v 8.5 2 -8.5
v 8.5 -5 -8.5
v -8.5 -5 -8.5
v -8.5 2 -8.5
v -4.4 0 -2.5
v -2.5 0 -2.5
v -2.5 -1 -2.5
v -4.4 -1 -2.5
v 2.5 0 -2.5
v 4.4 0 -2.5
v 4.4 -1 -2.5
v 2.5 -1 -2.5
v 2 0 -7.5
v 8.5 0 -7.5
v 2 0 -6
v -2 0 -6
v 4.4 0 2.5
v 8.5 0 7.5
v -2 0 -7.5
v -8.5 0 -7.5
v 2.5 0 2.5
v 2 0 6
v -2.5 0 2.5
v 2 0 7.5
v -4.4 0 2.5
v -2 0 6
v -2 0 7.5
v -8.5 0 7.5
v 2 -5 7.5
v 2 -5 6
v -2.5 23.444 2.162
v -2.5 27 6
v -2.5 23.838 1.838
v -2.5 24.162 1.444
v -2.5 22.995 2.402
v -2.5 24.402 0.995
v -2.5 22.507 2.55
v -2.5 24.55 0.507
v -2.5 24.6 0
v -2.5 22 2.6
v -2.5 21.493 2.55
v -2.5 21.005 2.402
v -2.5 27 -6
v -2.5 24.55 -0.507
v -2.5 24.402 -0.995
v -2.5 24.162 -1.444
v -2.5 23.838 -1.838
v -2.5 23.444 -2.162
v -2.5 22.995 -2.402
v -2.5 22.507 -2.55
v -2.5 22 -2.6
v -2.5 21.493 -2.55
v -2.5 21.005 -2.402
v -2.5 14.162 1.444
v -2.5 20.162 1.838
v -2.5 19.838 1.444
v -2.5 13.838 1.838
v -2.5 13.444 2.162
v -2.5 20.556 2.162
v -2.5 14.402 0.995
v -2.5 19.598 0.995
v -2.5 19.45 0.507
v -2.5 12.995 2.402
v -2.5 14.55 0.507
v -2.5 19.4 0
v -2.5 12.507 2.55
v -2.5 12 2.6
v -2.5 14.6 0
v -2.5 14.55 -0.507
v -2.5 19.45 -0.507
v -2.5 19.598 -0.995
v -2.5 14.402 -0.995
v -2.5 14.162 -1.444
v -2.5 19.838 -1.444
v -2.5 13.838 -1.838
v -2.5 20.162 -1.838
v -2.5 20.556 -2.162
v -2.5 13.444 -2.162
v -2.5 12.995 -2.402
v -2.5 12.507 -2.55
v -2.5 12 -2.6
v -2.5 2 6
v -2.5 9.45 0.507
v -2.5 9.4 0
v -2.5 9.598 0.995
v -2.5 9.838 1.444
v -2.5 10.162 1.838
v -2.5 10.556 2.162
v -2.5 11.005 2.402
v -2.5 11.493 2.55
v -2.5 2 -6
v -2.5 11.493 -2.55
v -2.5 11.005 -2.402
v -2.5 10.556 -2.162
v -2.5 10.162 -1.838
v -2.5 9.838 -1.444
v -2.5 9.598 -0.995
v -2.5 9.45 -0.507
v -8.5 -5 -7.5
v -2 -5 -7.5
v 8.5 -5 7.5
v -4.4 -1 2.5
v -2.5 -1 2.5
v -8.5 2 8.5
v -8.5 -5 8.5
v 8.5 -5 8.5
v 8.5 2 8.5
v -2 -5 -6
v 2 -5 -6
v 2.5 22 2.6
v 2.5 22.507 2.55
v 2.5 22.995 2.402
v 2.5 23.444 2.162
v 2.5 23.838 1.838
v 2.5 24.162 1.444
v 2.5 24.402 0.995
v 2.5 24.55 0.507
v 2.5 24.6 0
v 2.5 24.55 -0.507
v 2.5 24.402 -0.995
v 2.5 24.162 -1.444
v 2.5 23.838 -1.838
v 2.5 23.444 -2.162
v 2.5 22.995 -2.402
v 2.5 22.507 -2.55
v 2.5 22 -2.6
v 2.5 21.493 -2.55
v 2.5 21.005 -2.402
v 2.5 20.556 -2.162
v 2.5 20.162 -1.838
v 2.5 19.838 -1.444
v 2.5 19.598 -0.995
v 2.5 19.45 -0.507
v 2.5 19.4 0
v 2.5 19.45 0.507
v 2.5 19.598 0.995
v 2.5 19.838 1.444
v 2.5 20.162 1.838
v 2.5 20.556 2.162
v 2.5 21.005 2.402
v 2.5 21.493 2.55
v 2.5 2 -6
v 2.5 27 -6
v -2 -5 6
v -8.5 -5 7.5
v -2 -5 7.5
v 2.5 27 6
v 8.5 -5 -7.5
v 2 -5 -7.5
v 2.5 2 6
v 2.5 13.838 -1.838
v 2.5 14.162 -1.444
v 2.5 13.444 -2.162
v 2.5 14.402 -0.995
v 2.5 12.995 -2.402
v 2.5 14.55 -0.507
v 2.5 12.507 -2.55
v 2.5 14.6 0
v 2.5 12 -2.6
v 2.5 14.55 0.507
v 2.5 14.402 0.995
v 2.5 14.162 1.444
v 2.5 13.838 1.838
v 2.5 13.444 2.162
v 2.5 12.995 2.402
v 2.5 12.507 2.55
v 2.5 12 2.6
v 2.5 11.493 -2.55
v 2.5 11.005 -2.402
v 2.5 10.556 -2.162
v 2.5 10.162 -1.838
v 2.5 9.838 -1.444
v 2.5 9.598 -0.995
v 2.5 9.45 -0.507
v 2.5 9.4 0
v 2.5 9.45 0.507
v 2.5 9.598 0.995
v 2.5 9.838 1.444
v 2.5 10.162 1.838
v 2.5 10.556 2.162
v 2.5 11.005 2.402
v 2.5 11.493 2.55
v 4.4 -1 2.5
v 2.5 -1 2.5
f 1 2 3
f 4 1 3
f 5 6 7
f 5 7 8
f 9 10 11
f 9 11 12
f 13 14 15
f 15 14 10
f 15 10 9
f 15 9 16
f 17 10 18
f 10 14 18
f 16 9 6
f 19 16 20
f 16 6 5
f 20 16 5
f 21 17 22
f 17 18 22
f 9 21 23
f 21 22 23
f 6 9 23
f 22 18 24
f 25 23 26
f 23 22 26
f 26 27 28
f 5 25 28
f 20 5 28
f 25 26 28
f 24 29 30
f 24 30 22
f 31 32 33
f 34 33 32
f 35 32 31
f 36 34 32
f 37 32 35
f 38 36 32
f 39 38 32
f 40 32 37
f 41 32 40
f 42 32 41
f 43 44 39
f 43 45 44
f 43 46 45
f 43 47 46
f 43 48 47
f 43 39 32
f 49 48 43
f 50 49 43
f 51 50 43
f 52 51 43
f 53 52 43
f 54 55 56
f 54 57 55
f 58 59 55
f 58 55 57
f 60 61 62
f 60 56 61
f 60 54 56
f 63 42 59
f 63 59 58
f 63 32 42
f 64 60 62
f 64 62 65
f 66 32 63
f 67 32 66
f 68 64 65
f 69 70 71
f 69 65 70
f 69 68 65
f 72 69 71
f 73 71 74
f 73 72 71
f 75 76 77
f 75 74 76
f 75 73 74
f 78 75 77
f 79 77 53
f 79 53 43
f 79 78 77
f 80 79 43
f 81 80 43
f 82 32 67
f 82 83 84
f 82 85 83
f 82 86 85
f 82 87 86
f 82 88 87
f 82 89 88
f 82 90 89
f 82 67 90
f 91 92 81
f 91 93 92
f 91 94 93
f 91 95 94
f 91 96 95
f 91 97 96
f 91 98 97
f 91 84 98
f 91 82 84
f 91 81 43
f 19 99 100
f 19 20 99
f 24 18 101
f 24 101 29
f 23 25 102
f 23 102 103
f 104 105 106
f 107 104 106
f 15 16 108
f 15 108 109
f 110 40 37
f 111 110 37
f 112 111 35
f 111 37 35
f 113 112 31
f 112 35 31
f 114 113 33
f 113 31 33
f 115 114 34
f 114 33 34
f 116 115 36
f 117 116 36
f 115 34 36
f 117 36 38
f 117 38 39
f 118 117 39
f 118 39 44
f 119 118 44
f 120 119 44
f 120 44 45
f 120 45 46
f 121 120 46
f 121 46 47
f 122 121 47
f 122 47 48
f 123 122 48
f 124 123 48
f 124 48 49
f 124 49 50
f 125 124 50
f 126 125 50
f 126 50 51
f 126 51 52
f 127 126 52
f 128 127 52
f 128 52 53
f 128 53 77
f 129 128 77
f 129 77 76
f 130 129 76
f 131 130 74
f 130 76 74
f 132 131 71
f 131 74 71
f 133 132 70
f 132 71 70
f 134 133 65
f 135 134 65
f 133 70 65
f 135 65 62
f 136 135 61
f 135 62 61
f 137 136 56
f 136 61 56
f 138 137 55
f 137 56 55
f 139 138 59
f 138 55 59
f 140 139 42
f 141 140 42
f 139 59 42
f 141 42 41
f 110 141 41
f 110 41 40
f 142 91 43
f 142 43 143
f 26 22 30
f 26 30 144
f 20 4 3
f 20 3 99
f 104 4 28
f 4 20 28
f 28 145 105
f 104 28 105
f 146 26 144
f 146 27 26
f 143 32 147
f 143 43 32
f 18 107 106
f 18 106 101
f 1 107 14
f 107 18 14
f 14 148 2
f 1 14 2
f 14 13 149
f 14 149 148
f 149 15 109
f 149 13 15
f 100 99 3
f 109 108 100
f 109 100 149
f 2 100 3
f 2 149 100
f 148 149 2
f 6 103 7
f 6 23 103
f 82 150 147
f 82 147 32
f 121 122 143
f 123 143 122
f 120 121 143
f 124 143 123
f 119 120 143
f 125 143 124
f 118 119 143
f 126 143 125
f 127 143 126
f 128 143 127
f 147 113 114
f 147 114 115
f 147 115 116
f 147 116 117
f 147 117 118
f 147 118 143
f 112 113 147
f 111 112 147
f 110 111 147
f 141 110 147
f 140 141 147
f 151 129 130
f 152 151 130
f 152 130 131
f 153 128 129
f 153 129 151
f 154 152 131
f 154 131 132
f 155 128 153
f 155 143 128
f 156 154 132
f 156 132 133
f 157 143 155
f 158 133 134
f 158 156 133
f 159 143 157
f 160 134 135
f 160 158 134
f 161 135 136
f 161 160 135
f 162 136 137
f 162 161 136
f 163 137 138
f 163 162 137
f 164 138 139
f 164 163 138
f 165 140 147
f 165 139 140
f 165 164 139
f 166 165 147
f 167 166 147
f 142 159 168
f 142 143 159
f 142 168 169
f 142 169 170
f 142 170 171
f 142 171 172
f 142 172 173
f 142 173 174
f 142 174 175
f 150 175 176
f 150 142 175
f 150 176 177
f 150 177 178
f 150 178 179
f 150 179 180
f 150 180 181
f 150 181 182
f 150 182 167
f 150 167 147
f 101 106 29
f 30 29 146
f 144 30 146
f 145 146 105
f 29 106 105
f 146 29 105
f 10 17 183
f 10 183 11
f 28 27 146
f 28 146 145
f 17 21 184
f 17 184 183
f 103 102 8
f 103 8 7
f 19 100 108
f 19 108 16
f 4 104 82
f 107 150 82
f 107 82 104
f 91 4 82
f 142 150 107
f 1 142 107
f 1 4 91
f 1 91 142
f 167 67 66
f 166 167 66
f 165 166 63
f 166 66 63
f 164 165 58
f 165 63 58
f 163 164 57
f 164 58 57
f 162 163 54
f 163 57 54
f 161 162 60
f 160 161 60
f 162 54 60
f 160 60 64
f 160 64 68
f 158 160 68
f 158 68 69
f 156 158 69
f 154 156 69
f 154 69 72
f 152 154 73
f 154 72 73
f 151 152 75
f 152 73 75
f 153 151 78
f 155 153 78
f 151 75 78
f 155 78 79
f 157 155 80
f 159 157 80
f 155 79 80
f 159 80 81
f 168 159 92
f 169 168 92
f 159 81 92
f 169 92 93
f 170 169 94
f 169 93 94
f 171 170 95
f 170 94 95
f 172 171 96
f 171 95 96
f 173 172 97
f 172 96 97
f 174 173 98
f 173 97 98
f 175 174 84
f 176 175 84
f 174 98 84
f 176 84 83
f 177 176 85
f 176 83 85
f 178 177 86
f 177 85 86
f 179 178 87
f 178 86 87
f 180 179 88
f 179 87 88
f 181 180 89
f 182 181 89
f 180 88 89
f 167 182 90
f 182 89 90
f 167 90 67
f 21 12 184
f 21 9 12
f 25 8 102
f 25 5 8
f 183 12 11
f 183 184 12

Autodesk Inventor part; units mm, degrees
ref_plane "YZ Plane" through (0, 0, 0) normal (1, 0, 0) x (0, 1, 0)
ref_plane "XZ Plane" through (0, 0, 0) normal (0, 1, 0) x (-1, 0, 0)
ref_plane "XY Plane" through (0, 0, 0) normal (0, 0, 1) x (1, 0, 0)
sketch "草圖1" plane through (0, 0, 0) normal (0, 1, 0) x (-1, 0, 0)
  line L0 (8.5, 8.5) -> (-8.5, 8.5)
  line L1 (-8.5, 8.5) -> (-8.5, -8.5)
  line L2 (-8.5, -8.5) -> (8.5, -8.5)
  line L3 (8.5, -8.5) -> (8.5, 8.5)
  line L4 (8.5, 8.5) -> (-8.5, -8.5) construction
  line L5 (-8.5, 8.5) -> (8.5, -8.5) construction
  point P0 (0, 0)
  dimension "d0" = 17
  dimension "d1" = 17
extrude "擠出1" add sketch "草圖1" along normal blind 2
sketch "草圖3" plane through (0, 0, 0) normal (0, -1, 0) x (1, 0, 0)
  line L0 (-4.4, 2.5) -> (-2.5, 2.5)
  line L1 (-2.5, 2.5) -> (-2.5, -2.5)
  line L2 (-2.5, -2.5) -> (-4.4, -2.5)
  line L3 (-4.4, -2.5) -> (-4.4, 2.5)
  line L4 (-4.4, 2.5) -> (-2.5, -2.5) construction
  line L5 (-2.5, 2.5) -> (-4.4, -2.5) construction
  line L6 (2.5, 2.5) -> (4.4, 2.5)
  line L7 (4.4, 2.5) -> (4.4, -2.5)
  line L8 (4.4, -2.5) -> (2.5, -2.5)
  line L9 (2.5, -2.5) -> (2.5, 2.5)
  line L10 (2.5, 2.5) -> (4.4, -2.5) construction
  line L11 (4.4, 2.5) -> (2.5, -2.5) construction
  point P0 (0, 0)
  point P1 (-3.45, 0)
  point P2 (3.45, 0)
  dimension "d4" = 1.9
  dimension "d5" = 1.9
  dimension "d6" = 5
  dimension "d7" = 5
  dimension "d8" = 0
  dimension "d9" = 5
  dimension "d10" = 2.5
extrude "擠出2" add sketch "草圖3" along normal blind 1
sketch "草圖4" plane through (0, 0, 0) normal (0, -1, 0) x (1, 0, 0)
  line L0 (-8.5, -8.5) -> (-8.5, 8.5) projected
  line L1 (8.5, 8.5) -> (8.5, -8.5) projected
  line L2 (-8.5, 8.5) -> (8.5, 8.5)
  line L3 (8.5, 8.5) -> (8.5, 7.5)
  line L4 (8.5, 7.5) -> (-8.5, 7.5)
  line L5 (-8.5, 7.5) -> (-8.5, 8.5)
  line L6 (-8.5, -7.5) -> (8.5, -7.5)
  line L7 (8.5, -7.5) -> (8.5, -8.5)
  line L8 (8.5, -8.5) -> (-8.5, -8.5)
  line L9 (-8.5, -8.5) -> (-8.5, -7.5)
  point P0 (0, 0)
  point P1 (-8.5, -7.5)
  point P2 (-8.5, 7.5)
  dimension "d13" = 1
  dimension "d14" = 1
extrude "擠出3" add sketch "草圖4" along normal blind 5 contours L0 L6 L1 L8 | L0 L2 L1 L4
sketch "草圖5" plane through (8.5, 0, 7.5) normal (0, 0, -1) x (-1, 0, 0)
  line L0 (10.5, -12) -> (6.5, -12)
  line L1 (6.5, -12) -> (6.5, 2)
  line L2 (6.5, 2) -> (10.5, 2)
  line L3 (10.5, 2) -> (10.5, -12)
  line L4 (0, -5) -> (17, -5) projected
  line L5 (10.5, -12) -> (6.5, 2) construction
  line L6 (6.5, -12) -> (10.5, 2) construction
  point P0 (8.5, 0)
  point P1 (8.5, -5)
  point P2 (6.5, -5)
  point P3 (10.5, -5)
  dimension "d17" = 14
  dimension "d18" = 4
extrude "擠出4" add sketch "草圖5" along normal blind 1.5 contours L4 L1 L2 L3
sketch "草圖6" plane through (-8.5, 0, -7.5) normal (0, 0, 1) x (1, 0, 0)
  line L0 (6.5, 2) -> (10.5, 2)
  line L1 (10.5, 2) -> (10.5, -12)
  line L2 (10.5, -12) -> (6.5, -12)
  line L3 (6.5, -12) -> (6.5, 2)
  line L4 (10.5, -5) -> (6.5, -5) projected
  line L5 (6.5, 2) -> (10.5, -12) construction
  line L6 (10.5, 2) -> (6.5, -12) construction
  point P0 (8.5, 0)
  point P1 (8.5, -5)
  point P2 (10.5, -7)
  point P3 (6.5, -7)
  dimension "d21" = 14
  dimension "d22" = 4
extrude "擠出5" add sketch "草圖6" along normal blind 1.5 contours L0 L1 L4 L3
sketch "草圖7" plane through (0, 2, 0) normal (0, 1, 0) x (1, 0, 0)
  line L0 (-2.5, 6) -> (2.5, 6)
  line L1 (2.5, 6) -> (2.5, -6)
  line L2 (2.5, -6) -> (-2.5, -6)
  line L3 (-2.5, -6) -> (-2.5, 6)
  line L4 (-2.5, 6) -> (2.5, -6) construction
  line L5 (2.5, 6) -> (-2.5, -6) construction
  point P0 (0, 0)
  dimension "d25" = 12
  dimension "d26" = 5
extrude "擠出6" add sketch "草圖7" along normal blind 25
sketch "草圖8" plane through (-2.5, 2, -6) normal (-1, 0, 0) x (0, 0, 1)
  circle A0 centre (6, 20) radius 2.6
  circle A1 centre (6, 10) radius 2.6
  line L0 (-2.5, 0) -> (14.5, 0) projected
  point P0 (6, -2)
  point P1 (6, 0)
  dimension "d29" = 5.2
  dimension "d30" = 5.2
  dimension "d31" = 10
  dimension "d32" = 10
extrude "擠出7" cut sketch "草圖8" against normal blind 25
properties part number "差分線圈上蓋"
